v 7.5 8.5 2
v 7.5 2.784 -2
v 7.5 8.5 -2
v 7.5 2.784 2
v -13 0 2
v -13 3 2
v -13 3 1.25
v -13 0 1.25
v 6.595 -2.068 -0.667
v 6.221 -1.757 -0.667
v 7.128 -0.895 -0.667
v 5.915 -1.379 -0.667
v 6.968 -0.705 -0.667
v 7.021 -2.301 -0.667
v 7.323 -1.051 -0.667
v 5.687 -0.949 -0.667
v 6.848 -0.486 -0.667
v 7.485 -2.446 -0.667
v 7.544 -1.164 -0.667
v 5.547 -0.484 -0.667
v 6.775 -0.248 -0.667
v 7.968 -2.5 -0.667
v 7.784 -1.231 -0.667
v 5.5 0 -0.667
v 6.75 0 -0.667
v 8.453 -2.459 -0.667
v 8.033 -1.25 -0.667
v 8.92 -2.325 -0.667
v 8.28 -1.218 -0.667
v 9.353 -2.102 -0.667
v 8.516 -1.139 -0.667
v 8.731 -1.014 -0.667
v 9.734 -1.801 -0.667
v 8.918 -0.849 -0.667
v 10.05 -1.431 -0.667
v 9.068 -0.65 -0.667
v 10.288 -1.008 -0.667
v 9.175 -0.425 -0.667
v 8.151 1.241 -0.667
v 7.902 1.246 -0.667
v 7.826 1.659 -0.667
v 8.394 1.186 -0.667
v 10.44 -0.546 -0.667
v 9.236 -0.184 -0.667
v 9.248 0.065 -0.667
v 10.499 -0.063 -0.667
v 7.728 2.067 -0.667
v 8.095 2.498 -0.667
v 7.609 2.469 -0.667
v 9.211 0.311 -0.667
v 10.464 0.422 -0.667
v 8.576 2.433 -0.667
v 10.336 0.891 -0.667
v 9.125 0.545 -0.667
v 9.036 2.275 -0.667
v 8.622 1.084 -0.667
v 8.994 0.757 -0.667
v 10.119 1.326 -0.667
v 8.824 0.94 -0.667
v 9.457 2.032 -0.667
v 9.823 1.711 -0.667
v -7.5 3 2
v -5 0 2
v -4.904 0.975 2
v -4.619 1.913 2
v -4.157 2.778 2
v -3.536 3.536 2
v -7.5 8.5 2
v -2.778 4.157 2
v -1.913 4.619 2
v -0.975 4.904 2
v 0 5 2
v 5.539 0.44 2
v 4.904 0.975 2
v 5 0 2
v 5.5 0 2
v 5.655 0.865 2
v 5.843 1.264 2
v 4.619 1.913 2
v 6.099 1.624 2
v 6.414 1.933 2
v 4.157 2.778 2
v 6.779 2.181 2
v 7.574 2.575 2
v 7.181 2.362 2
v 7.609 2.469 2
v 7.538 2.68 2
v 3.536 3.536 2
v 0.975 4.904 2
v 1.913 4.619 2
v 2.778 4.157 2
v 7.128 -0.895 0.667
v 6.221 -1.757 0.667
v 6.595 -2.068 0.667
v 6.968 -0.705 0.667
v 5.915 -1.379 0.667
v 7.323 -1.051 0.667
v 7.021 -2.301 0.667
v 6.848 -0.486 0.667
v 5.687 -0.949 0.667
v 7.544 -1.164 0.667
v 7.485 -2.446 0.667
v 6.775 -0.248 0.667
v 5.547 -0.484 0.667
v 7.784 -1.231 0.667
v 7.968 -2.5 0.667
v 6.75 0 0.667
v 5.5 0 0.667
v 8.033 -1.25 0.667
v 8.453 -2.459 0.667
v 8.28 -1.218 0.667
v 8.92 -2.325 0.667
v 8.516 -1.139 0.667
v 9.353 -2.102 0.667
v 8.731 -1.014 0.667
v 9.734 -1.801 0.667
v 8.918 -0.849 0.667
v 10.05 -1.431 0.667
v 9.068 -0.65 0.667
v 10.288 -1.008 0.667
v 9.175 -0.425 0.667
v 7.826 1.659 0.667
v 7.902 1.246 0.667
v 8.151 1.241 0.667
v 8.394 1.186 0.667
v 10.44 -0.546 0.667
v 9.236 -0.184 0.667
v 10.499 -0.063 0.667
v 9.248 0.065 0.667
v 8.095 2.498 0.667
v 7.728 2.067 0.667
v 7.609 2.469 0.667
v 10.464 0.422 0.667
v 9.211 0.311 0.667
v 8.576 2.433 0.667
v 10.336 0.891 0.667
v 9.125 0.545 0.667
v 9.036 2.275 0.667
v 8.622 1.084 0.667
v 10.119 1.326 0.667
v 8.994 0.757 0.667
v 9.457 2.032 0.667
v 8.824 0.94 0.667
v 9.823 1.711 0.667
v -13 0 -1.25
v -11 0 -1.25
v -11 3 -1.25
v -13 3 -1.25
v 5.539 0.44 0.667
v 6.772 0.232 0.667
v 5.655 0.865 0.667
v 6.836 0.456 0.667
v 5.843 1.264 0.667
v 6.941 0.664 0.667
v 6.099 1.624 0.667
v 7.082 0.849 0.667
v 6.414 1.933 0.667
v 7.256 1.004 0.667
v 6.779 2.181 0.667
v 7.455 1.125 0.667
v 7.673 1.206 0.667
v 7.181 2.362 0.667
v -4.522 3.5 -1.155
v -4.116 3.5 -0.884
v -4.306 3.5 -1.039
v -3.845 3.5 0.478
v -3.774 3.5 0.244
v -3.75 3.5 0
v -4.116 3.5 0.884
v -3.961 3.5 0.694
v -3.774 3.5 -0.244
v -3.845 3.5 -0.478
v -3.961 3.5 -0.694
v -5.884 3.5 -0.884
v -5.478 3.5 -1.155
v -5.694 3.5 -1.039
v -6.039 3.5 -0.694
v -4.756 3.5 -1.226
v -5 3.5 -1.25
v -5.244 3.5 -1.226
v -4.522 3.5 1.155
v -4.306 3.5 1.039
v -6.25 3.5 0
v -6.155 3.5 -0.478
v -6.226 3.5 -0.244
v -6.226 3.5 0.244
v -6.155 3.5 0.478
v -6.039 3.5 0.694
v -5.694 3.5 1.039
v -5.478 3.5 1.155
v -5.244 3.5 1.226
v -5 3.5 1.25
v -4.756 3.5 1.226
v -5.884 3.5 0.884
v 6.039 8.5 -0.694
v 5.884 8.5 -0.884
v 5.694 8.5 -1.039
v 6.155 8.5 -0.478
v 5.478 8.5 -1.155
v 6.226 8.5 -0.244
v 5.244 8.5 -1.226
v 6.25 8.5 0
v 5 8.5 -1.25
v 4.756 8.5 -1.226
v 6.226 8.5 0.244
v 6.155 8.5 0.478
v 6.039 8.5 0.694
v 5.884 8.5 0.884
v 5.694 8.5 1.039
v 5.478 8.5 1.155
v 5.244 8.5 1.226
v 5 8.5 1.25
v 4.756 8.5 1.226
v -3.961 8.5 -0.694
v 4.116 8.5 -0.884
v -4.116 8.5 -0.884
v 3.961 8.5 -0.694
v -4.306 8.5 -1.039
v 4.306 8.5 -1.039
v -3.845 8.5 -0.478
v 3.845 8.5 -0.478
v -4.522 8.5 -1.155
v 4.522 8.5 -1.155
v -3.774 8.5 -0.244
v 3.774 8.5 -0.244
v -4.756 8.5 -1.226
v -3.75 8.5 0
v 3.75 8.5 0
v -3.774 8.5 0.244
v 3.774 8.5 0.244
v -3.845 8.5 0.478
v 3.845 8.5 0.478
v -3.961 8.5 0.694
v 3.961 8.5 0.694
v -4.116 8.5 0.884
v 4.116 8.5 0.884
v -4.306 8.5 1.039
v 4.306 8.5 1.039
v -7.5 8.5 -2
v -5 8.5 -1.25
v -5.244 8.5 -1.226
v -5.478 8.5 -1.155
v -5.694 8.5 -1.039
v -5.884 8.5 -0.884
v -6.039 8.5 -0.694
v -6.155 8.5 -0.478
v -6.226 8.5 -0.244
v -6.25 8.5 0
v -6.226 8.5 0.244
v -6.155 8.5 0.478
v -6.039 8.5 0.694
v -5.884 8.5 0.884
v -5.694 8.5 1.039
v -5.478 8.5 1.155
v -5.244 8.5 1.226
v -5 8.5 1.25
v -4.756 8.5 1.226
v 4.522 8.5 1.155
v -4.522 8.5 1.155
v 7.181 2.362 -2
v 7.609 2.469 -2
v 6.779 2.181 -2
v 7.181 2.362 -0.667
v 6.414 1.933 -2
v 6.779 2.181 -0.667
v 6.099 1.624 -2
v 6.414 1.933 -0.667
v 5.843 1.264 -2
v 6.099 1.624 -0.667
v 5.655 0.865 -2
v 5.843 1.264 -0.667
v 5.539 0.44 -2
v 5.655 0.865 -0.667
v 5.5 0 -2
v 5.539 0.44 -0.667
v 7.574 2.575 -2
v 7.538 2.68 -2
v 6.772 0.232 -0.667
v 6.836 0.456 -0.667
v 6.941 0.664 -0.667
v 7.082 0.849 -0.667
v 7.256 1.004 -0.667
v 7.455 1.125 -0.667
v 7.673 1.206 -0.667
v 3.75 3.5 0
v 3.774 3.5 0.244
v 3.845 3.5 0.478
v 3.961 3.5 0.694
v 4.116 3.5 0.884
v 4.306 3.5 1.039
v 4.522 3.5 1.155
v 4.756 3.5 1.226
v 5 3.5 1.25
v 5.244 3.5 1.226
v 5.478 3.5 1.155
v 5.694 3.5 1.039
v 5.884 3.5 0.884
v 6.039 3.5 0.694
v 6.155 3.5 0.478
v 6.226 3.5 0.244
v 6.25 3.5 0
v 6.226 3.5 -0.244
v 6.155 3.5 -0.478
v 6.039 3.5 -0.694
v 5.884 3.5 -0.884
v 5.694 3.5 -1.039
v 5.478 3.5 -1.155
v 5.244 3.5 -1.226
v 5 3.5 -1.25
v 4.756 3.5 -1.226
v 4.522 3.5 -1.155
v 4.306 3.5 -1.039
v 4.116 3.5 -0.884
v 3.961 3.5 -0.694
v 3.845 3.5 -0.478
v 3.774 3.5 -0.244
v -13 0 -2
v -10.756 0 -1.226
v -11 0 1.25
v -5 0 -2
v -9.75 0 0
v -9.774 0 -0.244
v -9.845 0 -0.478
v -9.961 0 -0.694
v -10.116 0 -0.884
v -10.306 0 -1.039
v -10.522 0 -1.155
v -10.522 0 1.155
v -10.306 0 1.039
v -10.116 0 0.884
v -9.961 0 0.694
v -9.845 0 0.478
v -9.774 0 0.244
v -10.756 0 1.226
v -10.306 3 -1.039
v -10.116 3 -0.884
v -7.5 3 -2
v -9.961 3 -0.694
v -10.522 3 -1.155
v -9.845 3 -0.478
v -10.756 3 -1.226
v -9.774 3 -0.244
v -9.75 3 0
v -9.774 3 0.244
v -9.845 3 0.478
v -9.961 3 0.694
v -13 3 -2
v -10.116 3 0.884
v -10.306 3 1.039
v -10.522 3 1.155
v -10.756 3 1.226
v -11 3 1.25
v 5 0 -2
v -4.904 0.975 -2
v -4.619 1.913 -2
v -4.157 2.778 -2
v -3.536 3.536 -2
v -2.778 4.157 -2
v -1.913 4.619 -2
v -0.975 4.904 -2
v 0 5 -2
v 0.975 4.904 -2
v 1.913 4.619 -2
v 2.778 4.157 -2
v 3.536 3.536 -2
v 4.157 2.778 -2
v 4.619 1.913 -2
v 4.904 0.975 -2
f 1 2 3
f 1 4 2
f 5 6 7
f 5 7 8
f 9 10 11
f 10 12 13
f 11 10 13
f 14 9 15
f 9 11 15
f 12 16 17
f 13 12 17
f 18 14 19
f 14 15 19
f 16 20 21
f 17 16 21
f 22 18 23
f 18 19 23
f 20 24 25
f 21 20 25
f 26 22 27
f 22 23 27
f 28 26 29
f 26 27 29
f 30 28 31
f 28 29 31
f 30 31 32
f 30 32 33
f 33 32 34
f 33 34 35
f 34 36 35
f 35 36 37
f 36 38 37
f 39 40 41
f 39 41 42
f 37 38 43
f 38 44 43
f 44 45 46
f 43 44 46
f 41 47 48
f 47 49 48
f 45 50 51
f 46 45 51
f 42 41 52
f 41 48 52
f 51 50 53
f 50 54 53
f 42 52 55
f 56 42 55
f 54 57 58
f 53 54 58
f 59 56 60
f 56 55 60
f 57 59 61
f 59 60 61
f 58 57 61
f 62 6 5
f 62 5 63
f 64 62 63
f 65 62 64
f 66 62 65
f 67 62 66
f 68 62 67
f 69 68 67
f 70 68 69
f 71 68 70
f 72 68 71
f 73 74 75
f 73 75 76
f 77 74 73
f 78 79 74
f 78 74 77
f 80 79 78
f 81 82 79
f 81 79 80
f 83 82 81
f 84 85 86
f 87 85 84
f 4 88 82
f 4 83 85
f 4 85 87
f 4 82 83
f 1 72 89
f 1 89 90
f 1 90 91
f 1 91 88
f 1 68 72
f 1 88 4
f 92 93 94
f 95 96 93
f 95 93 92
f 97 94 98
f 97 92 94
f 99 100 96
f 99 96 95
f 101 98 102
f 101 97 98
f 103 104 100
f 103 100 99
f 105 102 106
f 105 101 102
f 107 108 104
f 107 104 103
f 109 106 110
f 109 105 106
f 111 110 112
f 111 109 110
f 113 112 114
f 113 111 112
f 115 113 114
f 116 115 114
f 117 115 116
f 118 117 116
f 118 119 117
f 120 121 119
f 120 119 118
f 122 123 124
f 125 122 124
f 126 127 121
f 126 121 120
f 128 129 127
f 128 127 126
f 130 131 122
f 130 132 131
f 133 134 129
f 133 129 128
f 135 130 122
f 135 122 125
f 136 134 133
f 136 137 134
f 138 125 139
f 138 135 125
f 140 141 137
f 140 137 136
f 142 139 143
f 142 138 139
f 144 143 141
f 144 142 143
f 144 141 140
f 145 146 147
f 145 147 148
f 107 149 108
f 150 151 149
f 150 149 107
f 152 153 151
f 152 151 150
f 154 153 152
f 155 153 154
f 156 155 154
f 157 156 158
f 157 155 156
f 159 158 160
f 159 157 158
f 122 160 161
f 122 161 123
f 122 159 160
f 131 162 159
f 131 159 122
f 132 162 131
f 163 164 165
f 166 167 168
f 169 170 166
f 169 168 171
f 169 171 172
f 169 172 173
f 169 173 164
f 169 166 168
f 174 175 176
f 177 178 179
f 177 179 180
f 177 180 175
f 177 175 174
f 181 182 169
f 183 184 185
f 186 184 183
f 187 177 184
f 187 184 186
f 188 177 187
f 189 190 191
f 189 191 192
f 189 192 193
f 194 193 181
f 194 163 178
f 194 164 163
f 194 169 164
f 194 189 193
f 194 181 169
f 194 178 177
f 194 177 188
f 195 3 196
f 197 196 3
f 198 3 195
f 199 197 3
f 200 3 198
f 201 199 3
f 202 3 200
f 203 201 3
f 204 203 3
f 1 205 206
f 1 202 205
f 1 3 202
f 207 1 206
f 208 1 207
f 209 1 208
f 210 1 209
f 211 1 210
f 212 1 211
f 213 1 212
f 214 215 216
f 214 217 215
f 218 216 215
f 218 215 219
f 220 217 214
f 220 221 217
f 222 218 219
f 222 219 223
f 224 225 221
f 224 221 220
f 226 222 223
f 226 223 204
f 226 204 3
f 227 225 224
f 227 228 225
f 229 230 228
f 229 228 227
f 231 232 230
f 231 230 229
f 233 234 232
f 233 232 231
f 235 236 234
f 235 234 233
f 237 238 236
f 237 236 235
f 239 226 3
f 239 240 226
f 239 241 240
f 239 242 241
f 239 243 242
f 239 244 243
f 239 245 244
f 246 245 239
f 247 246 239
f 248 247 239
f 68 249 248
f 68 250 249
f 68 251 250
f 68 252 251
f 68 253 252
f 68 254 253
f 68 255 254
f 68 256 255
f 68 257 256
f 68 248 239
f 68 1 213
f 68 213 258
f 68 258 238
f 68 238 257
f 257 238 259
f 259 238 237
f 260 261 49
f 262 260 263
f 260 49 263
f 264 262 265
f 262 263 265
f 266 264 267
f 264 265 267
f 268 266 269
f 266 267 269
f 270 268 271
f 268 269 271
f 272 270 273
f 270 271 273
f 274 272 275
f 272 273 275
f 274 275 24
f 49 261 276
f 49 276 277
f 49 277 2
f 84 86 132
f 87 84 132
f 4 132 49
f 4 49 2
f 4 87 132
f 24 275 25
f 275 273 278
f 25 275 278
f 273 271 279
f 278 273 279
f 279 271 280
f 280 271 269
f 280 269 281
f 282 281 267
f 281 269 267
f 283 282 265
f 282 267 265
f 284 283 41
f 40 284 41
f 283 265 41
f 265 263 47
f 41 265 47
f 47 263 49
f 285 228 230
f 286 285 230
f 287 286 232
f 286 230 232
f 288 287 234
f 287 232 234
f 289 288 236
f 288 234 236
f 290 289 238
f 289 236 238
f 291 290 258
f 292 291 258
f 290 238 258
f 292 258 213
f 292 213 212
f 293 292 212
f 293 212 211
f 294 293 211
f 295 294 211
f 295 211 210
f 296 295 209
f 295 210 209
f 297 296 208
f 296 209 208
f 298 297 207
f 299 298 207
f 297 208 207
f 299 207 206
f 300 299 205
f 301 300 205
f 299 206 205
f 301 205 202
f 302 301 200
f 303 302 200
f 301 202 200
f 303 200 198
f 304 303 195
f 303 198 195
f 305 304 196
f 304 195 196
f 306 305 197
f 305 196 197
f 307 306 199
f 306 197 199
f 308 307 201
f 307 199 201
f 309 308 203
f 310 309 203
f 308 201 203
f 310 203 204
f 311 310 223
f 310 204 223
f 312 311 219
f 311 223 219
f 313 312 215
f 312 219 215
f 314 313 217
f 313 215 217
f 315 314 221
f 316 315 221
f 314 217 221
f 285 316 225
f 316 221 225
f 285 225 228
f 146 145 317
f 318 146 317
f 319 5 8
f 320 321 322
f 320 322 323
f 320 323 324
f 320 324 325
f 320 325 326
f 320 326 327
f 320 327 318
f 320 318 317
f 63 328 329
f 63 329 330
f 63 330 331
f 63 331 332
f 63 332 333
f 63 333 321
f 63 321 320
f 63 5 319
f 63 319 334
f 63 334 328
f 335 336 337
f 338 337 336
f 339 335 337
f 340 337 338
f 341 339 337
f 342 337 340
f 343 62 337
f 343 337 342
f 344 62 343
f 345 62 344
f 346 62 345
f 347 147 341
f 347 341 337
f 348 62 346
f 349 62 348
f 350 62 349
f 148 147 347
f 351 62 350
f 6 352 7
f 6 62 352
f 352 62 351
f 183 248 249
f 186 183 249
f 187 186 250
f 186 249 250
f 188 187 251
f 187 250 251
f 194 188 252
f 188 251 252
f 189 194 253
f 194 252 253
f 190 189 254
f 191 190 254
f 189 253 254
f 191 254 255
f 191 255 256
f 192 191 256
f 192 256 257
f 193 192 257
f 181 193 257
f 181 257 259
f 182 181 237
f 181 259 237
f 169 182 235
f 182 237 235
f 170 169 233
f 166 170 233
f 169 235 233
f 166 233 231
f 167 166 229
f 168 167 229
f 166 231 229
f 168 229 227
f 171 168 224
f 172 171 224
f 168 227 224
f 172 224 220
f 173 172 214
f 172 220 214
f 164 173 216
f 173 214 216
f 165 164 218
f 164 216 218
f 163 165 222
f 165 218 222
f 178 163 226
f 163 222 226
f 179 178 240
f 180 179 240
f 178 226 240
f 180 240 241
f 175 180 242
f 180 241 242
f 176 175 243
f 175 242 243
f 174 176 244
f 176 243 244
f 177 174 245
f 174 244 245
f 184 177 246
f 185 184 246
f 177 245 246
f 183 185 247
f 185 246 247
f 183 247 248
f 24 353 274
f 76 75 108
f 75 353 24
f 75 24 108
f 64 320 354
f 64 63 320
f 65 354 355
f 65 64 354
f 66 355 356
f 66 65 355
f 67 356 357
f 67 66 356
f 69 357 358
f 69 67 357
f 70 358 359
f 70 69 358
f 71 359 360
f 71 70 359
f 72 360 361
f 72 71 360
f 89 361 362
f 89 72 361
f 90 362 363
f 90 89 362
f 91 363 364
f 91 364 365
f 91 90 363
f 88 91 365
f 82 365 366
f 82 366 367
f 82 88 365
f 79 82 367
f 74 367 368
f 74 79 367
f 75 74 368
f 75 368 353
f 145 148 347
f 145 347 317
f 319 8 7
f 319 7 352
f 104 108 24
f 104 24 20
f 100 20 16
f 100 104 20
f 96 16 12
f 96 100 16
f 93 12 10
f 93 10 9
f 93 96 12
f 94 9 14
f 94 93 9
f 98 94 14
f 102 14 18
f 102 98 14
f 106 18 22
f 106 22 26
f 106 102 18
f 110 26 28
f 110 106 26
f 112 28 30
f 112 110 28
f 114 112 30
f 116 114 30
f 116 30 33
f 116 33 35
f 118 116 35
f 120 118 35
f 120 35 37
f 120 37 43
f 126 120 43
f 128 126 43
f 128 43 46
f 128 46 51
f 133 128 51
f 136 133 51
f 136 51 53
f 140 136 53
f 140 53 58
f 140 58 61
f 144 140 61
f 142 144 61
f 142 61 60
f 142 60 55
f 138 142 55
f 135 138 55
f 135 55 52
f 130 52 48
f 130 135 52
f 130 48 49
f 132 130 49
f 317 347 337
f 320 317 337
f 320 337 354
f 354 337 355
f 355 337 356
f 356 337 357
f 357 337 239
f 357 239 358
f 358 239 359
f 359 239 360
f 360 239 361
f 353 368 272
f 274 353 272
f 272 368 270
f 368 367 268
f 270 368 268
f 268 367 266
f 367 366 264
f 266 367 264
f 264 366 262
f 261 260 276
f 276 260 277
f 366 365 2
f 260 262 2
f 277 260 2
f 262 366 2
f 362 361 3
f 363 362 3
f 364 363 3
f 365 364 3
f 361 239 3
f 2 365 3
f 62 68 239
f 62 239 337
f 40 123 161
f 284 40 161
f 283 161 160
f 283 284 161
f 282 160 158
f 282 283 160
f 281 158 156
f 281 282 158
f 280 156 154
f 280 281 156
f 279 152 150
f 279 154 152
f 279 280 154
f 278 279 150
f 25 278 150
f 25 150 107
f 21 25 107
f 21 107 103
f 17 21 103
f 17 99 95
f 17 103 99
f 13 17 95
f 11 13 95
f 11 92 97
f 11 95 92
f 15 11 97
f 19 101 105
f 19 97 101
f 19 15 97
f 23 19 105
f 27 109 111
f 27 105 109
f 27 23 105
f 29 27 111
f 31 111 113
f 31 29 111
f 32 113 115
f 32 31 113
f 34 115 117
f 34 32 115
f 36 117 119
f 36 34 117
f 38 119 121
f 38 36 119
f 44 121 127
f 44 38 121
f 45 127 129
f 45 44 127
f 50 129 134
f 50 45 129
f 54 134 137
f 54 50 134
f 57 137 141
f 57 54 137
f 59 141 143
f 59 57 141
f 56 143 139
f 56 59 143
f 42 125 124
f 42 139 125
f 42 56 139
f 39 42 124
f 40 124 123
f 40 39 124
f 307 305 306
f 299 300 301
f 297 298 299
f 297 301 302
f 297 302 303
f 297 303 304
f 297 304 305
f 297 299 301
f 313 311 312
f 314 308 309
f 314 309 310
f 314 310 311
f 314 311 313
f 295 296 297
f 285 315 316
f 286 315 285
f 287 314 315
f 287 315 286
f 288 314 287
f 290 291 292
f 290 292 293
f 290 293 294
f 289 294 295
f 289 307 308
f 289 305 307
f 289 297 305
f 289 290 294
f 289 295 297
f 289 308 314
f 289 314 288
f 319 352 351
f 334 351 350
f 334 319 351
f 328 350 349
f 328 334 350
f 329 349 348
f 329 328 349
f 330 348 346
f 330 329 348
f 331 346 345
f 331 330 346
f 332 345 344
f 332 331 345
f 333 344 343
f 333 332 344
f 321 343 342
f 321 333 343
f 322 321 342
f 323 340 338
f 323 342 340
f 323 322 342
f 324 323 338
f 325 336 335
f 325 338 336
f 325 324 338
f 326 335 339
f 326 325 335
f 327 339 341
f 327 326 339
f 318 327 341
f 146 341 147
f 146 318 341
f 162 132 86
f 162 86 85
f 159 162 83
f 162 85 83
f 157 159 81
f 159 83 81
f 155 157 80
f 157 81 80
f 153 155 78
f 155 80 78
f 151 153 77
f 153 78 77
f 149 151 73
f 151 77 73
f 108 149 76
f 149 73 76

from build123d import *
from OCP.BRepAlgoAPI import BRepAlgoAPI_Cut
from OCP.TopTools import TopTools_ListOfShape

# Parameters (mm, degrees)
BOSS_EXTRUDE1_DEPTH     = 2
SKETCH2_R               = 2.5
BOSS_EXTRUDE2_DEPTH     = 0.666666667
CUT_EXTRUDE1_START      = -4
SKETCH3_R               = 1.25
CUT_EXTRUDE1_DEPTH      = 4
CUT_EXTRUDE3_DEPTH      = 15.256577429
CUT_EXTRUDE3_DEPTH_BACK = 3
BOSS_EXTRUDE3_DEPTH     = 2
CUT_EXTRUDE8_START      = -0.666667
SKETCH7_R               = 2.5
CUT_EXTRUDE8_DEPTH      = 1.333333333
CUT_EXTRUDE9_START      = 2.000000333
SKETCH8_R               = 2.5
CUT_EXTRUDE9_DEPTH      = 1.333333333
SKETCH9_R               = 1.25
CUT_EXTRUDE10_DEPTH     = 5


with BuildPart() as part:
    # Sketch1 → Boss-Extrude1 (new, symmetric)
    with BuildSketch(Plane.XY):
        with BuildLine():
            Line((-8, 0), (-5, 0))
            ThreePointArc((-5, 0), (0, 5), (5, 0))
            Line((5, 0), (8, 0))
            ThreePointArc((8, 0), (1.5281381, 7.85269342), (-7.416198487, 3))
            ThreePointArc((-7.416198487, 3), (-7.85269342, 1.5281381), (-8, 0))
        make_face()
        with BuildLine():
            Line((-13, 0), (-8, 0))
            ThreePointArc((-8, 0), (-7.85269342, 1.5281381), (-7.416198487, 3))
            Line((-7.416198487, 3), (-13, 3))
            Line((-13, 3), (-13, 0))
        make_face()
    extrude(amount=BOSS_EXTRUDE1_DEPTH, both=True)

    # Sketch2 → Boss-Extrude2 (add, symmetric)
    with BuildSketch(Plane.XY):
        with Locations((8, 0)):
            Circle(SKETCH2_R)
    extrude(amount=BOSS_EXTRUDE2_DEPTH, both=True)

    # Sketch3 → Cut-Extrude1 (cut)
    with BuildSketch(Plane.XY.offset(2).offset(CUT_EXTRUDE1_START)):
        with Locations(Location((8, 0, 0), (0, 0, 94.480798786))):
            Circle(SKETCH3_R)
    extrude(amount=CUT_EXTRUDE1_DEPTH, mode=Mode.SUBTRACT)

    # Sketch4 → Cut-Extrude3 (cut, two sides: drawn at the far end of the back side and taken through both)
    with BuildSketch(Plane(origin=(0, 3, 0), x_dir=(1, 0, 0), z_dir=(0, 1, 0)).offset(-CUT_EXTRUDE3_DEPTH_BACK)):
        with BuildLine():
            ThreePointArc((-11, -1.25), (-9.75, 0), (-11, 1.25))
            Line((-11, 1.25), (-13, 1.25))
            Line((-13, 1.25), (-13, -1.25))
            Line((-13, -1.25), (-11, -1.25))
        make_face()
    extrude(amount=CUT_EXTRUDE3_DEPTH + CUT_EXTRUDE3_DEPTH_BACK, mode=Mode.SUBTRACT)

    # Sketch6 → Boss-Extrude3 (add, symmetric)
    with BuildSketch(Plane.XY):
        with BuildLine():
            Line((7.5, 8.5), (-7.5, 8.5))
            Line((-7.5, 8.5), (-7.5, 2.783882181))
            ThreePointArc((-7.5, 2.783882181), (0, 8), (7.5, 2.783882181))
            Line((7.5, 2.783882181), (7.5, 8.5))
        make_face()
    extrude(amount=BOSS_EXTRUDE3_DEPTH, both=True)


with BuildPart() as cut_extrude8_tool:
    # Sketch7 → Cut-Extrude8 (new body)
    with BuildSketch(Plane.XY.offset(CUT_EXTRUDE8_START)):
        with Locations((8, 0)):
            Circle(SKETCH7_R)
    extrude(amount=-CUT_EXTRUDE8_DEPTH)


with BuildPart() as part_1:
    add(part.part)

    # Cut-Extrude8: cut by cut_extrude8_tool, with a tolerance
    cut_extrude8_stock = TopTools_ListOfShape()
    cut_extrude8_stock.Append(part_1.part.wrapped)
    cut_extrude8_tools = TopTools_ListOfShape()
    cut_extrude8_tools.Append(cut_extrude8_tool.part.wrapped)
    cut_extrude8_cut = BRepAlgoAPI_Cut()
    cut_extrude8_cut.SetArguments(cut_extrude8_stock)
    cut_extrude8_cut.SetTools(cut_extrude8_tools)
    cut_extrude8_cut.SetFuzzyValue(0.00001)
    cut_extrude8_cut.Build()
    add(Compound.cast(cut_extrude8_cut.Shape()).solids(), mode=Mode.REPLACE)


with BuildPart() as cut_extrude9_tool:
    # Sketch8 → Cut-Extrude9 (new body)
    with BuildSketch(Plane.XY.offset(CUT_EXTRUDE9_START)):
        with Locations((8, 0)):
            Circle(SKETCH8_R)
    extrude(amount=-CUT_EXTRUDE9_DEPTH)


with BuildPart() as part_2:
    add(part_1.part)

    # Cut-Extrude9: cut by cut_extrude9_tool, with a tolerance
    cut_extrude9_stock = TopTools_ListOfShape()
    cut_extrude9_stock.Append(part_2.part.wrapped)
    cut_extrude9_tools = TopTools_ListOfShape()
    cut_extrude9_tools.Append(cut_extrude9_tool.part.wrapped)
    cut_extrude9_cut = BRepAlgoAPI_Cut()
    cut_extrude9_cut.SetArguments(cut_extrude9_stock)
    cut_extrude9_cut.SetTools(cut_extrude9_tools)
    cut_extrude9_cut.SetFuzzyValue(0.00001)
    cut_extrude9_cut.Build()
    add(Compound.cast(cut_extrude9_cut.Shape()).solids(), mode=Mode.REPLACE)

    # Sketch9 → Cut-Extrude10 (cut)
    with BuildSketch(Plane(origin=(0, 8.5, 0), x_dir=(1, 0, 0), z_dir=(0, 1, 0))):
        with Locations(Location((-5, 0, 0), (0, 0, 180))):
            Circle(SKETCH9_R)
        with Locations(Location((5, 0, 0), (0, 0, 180))):
            Circle(SKETCH9_R)
    extrude(amount=-CUT_EXTRUDE10_DEPTH, mode=Mode.SUBTRACT)


solid = part_2.part
